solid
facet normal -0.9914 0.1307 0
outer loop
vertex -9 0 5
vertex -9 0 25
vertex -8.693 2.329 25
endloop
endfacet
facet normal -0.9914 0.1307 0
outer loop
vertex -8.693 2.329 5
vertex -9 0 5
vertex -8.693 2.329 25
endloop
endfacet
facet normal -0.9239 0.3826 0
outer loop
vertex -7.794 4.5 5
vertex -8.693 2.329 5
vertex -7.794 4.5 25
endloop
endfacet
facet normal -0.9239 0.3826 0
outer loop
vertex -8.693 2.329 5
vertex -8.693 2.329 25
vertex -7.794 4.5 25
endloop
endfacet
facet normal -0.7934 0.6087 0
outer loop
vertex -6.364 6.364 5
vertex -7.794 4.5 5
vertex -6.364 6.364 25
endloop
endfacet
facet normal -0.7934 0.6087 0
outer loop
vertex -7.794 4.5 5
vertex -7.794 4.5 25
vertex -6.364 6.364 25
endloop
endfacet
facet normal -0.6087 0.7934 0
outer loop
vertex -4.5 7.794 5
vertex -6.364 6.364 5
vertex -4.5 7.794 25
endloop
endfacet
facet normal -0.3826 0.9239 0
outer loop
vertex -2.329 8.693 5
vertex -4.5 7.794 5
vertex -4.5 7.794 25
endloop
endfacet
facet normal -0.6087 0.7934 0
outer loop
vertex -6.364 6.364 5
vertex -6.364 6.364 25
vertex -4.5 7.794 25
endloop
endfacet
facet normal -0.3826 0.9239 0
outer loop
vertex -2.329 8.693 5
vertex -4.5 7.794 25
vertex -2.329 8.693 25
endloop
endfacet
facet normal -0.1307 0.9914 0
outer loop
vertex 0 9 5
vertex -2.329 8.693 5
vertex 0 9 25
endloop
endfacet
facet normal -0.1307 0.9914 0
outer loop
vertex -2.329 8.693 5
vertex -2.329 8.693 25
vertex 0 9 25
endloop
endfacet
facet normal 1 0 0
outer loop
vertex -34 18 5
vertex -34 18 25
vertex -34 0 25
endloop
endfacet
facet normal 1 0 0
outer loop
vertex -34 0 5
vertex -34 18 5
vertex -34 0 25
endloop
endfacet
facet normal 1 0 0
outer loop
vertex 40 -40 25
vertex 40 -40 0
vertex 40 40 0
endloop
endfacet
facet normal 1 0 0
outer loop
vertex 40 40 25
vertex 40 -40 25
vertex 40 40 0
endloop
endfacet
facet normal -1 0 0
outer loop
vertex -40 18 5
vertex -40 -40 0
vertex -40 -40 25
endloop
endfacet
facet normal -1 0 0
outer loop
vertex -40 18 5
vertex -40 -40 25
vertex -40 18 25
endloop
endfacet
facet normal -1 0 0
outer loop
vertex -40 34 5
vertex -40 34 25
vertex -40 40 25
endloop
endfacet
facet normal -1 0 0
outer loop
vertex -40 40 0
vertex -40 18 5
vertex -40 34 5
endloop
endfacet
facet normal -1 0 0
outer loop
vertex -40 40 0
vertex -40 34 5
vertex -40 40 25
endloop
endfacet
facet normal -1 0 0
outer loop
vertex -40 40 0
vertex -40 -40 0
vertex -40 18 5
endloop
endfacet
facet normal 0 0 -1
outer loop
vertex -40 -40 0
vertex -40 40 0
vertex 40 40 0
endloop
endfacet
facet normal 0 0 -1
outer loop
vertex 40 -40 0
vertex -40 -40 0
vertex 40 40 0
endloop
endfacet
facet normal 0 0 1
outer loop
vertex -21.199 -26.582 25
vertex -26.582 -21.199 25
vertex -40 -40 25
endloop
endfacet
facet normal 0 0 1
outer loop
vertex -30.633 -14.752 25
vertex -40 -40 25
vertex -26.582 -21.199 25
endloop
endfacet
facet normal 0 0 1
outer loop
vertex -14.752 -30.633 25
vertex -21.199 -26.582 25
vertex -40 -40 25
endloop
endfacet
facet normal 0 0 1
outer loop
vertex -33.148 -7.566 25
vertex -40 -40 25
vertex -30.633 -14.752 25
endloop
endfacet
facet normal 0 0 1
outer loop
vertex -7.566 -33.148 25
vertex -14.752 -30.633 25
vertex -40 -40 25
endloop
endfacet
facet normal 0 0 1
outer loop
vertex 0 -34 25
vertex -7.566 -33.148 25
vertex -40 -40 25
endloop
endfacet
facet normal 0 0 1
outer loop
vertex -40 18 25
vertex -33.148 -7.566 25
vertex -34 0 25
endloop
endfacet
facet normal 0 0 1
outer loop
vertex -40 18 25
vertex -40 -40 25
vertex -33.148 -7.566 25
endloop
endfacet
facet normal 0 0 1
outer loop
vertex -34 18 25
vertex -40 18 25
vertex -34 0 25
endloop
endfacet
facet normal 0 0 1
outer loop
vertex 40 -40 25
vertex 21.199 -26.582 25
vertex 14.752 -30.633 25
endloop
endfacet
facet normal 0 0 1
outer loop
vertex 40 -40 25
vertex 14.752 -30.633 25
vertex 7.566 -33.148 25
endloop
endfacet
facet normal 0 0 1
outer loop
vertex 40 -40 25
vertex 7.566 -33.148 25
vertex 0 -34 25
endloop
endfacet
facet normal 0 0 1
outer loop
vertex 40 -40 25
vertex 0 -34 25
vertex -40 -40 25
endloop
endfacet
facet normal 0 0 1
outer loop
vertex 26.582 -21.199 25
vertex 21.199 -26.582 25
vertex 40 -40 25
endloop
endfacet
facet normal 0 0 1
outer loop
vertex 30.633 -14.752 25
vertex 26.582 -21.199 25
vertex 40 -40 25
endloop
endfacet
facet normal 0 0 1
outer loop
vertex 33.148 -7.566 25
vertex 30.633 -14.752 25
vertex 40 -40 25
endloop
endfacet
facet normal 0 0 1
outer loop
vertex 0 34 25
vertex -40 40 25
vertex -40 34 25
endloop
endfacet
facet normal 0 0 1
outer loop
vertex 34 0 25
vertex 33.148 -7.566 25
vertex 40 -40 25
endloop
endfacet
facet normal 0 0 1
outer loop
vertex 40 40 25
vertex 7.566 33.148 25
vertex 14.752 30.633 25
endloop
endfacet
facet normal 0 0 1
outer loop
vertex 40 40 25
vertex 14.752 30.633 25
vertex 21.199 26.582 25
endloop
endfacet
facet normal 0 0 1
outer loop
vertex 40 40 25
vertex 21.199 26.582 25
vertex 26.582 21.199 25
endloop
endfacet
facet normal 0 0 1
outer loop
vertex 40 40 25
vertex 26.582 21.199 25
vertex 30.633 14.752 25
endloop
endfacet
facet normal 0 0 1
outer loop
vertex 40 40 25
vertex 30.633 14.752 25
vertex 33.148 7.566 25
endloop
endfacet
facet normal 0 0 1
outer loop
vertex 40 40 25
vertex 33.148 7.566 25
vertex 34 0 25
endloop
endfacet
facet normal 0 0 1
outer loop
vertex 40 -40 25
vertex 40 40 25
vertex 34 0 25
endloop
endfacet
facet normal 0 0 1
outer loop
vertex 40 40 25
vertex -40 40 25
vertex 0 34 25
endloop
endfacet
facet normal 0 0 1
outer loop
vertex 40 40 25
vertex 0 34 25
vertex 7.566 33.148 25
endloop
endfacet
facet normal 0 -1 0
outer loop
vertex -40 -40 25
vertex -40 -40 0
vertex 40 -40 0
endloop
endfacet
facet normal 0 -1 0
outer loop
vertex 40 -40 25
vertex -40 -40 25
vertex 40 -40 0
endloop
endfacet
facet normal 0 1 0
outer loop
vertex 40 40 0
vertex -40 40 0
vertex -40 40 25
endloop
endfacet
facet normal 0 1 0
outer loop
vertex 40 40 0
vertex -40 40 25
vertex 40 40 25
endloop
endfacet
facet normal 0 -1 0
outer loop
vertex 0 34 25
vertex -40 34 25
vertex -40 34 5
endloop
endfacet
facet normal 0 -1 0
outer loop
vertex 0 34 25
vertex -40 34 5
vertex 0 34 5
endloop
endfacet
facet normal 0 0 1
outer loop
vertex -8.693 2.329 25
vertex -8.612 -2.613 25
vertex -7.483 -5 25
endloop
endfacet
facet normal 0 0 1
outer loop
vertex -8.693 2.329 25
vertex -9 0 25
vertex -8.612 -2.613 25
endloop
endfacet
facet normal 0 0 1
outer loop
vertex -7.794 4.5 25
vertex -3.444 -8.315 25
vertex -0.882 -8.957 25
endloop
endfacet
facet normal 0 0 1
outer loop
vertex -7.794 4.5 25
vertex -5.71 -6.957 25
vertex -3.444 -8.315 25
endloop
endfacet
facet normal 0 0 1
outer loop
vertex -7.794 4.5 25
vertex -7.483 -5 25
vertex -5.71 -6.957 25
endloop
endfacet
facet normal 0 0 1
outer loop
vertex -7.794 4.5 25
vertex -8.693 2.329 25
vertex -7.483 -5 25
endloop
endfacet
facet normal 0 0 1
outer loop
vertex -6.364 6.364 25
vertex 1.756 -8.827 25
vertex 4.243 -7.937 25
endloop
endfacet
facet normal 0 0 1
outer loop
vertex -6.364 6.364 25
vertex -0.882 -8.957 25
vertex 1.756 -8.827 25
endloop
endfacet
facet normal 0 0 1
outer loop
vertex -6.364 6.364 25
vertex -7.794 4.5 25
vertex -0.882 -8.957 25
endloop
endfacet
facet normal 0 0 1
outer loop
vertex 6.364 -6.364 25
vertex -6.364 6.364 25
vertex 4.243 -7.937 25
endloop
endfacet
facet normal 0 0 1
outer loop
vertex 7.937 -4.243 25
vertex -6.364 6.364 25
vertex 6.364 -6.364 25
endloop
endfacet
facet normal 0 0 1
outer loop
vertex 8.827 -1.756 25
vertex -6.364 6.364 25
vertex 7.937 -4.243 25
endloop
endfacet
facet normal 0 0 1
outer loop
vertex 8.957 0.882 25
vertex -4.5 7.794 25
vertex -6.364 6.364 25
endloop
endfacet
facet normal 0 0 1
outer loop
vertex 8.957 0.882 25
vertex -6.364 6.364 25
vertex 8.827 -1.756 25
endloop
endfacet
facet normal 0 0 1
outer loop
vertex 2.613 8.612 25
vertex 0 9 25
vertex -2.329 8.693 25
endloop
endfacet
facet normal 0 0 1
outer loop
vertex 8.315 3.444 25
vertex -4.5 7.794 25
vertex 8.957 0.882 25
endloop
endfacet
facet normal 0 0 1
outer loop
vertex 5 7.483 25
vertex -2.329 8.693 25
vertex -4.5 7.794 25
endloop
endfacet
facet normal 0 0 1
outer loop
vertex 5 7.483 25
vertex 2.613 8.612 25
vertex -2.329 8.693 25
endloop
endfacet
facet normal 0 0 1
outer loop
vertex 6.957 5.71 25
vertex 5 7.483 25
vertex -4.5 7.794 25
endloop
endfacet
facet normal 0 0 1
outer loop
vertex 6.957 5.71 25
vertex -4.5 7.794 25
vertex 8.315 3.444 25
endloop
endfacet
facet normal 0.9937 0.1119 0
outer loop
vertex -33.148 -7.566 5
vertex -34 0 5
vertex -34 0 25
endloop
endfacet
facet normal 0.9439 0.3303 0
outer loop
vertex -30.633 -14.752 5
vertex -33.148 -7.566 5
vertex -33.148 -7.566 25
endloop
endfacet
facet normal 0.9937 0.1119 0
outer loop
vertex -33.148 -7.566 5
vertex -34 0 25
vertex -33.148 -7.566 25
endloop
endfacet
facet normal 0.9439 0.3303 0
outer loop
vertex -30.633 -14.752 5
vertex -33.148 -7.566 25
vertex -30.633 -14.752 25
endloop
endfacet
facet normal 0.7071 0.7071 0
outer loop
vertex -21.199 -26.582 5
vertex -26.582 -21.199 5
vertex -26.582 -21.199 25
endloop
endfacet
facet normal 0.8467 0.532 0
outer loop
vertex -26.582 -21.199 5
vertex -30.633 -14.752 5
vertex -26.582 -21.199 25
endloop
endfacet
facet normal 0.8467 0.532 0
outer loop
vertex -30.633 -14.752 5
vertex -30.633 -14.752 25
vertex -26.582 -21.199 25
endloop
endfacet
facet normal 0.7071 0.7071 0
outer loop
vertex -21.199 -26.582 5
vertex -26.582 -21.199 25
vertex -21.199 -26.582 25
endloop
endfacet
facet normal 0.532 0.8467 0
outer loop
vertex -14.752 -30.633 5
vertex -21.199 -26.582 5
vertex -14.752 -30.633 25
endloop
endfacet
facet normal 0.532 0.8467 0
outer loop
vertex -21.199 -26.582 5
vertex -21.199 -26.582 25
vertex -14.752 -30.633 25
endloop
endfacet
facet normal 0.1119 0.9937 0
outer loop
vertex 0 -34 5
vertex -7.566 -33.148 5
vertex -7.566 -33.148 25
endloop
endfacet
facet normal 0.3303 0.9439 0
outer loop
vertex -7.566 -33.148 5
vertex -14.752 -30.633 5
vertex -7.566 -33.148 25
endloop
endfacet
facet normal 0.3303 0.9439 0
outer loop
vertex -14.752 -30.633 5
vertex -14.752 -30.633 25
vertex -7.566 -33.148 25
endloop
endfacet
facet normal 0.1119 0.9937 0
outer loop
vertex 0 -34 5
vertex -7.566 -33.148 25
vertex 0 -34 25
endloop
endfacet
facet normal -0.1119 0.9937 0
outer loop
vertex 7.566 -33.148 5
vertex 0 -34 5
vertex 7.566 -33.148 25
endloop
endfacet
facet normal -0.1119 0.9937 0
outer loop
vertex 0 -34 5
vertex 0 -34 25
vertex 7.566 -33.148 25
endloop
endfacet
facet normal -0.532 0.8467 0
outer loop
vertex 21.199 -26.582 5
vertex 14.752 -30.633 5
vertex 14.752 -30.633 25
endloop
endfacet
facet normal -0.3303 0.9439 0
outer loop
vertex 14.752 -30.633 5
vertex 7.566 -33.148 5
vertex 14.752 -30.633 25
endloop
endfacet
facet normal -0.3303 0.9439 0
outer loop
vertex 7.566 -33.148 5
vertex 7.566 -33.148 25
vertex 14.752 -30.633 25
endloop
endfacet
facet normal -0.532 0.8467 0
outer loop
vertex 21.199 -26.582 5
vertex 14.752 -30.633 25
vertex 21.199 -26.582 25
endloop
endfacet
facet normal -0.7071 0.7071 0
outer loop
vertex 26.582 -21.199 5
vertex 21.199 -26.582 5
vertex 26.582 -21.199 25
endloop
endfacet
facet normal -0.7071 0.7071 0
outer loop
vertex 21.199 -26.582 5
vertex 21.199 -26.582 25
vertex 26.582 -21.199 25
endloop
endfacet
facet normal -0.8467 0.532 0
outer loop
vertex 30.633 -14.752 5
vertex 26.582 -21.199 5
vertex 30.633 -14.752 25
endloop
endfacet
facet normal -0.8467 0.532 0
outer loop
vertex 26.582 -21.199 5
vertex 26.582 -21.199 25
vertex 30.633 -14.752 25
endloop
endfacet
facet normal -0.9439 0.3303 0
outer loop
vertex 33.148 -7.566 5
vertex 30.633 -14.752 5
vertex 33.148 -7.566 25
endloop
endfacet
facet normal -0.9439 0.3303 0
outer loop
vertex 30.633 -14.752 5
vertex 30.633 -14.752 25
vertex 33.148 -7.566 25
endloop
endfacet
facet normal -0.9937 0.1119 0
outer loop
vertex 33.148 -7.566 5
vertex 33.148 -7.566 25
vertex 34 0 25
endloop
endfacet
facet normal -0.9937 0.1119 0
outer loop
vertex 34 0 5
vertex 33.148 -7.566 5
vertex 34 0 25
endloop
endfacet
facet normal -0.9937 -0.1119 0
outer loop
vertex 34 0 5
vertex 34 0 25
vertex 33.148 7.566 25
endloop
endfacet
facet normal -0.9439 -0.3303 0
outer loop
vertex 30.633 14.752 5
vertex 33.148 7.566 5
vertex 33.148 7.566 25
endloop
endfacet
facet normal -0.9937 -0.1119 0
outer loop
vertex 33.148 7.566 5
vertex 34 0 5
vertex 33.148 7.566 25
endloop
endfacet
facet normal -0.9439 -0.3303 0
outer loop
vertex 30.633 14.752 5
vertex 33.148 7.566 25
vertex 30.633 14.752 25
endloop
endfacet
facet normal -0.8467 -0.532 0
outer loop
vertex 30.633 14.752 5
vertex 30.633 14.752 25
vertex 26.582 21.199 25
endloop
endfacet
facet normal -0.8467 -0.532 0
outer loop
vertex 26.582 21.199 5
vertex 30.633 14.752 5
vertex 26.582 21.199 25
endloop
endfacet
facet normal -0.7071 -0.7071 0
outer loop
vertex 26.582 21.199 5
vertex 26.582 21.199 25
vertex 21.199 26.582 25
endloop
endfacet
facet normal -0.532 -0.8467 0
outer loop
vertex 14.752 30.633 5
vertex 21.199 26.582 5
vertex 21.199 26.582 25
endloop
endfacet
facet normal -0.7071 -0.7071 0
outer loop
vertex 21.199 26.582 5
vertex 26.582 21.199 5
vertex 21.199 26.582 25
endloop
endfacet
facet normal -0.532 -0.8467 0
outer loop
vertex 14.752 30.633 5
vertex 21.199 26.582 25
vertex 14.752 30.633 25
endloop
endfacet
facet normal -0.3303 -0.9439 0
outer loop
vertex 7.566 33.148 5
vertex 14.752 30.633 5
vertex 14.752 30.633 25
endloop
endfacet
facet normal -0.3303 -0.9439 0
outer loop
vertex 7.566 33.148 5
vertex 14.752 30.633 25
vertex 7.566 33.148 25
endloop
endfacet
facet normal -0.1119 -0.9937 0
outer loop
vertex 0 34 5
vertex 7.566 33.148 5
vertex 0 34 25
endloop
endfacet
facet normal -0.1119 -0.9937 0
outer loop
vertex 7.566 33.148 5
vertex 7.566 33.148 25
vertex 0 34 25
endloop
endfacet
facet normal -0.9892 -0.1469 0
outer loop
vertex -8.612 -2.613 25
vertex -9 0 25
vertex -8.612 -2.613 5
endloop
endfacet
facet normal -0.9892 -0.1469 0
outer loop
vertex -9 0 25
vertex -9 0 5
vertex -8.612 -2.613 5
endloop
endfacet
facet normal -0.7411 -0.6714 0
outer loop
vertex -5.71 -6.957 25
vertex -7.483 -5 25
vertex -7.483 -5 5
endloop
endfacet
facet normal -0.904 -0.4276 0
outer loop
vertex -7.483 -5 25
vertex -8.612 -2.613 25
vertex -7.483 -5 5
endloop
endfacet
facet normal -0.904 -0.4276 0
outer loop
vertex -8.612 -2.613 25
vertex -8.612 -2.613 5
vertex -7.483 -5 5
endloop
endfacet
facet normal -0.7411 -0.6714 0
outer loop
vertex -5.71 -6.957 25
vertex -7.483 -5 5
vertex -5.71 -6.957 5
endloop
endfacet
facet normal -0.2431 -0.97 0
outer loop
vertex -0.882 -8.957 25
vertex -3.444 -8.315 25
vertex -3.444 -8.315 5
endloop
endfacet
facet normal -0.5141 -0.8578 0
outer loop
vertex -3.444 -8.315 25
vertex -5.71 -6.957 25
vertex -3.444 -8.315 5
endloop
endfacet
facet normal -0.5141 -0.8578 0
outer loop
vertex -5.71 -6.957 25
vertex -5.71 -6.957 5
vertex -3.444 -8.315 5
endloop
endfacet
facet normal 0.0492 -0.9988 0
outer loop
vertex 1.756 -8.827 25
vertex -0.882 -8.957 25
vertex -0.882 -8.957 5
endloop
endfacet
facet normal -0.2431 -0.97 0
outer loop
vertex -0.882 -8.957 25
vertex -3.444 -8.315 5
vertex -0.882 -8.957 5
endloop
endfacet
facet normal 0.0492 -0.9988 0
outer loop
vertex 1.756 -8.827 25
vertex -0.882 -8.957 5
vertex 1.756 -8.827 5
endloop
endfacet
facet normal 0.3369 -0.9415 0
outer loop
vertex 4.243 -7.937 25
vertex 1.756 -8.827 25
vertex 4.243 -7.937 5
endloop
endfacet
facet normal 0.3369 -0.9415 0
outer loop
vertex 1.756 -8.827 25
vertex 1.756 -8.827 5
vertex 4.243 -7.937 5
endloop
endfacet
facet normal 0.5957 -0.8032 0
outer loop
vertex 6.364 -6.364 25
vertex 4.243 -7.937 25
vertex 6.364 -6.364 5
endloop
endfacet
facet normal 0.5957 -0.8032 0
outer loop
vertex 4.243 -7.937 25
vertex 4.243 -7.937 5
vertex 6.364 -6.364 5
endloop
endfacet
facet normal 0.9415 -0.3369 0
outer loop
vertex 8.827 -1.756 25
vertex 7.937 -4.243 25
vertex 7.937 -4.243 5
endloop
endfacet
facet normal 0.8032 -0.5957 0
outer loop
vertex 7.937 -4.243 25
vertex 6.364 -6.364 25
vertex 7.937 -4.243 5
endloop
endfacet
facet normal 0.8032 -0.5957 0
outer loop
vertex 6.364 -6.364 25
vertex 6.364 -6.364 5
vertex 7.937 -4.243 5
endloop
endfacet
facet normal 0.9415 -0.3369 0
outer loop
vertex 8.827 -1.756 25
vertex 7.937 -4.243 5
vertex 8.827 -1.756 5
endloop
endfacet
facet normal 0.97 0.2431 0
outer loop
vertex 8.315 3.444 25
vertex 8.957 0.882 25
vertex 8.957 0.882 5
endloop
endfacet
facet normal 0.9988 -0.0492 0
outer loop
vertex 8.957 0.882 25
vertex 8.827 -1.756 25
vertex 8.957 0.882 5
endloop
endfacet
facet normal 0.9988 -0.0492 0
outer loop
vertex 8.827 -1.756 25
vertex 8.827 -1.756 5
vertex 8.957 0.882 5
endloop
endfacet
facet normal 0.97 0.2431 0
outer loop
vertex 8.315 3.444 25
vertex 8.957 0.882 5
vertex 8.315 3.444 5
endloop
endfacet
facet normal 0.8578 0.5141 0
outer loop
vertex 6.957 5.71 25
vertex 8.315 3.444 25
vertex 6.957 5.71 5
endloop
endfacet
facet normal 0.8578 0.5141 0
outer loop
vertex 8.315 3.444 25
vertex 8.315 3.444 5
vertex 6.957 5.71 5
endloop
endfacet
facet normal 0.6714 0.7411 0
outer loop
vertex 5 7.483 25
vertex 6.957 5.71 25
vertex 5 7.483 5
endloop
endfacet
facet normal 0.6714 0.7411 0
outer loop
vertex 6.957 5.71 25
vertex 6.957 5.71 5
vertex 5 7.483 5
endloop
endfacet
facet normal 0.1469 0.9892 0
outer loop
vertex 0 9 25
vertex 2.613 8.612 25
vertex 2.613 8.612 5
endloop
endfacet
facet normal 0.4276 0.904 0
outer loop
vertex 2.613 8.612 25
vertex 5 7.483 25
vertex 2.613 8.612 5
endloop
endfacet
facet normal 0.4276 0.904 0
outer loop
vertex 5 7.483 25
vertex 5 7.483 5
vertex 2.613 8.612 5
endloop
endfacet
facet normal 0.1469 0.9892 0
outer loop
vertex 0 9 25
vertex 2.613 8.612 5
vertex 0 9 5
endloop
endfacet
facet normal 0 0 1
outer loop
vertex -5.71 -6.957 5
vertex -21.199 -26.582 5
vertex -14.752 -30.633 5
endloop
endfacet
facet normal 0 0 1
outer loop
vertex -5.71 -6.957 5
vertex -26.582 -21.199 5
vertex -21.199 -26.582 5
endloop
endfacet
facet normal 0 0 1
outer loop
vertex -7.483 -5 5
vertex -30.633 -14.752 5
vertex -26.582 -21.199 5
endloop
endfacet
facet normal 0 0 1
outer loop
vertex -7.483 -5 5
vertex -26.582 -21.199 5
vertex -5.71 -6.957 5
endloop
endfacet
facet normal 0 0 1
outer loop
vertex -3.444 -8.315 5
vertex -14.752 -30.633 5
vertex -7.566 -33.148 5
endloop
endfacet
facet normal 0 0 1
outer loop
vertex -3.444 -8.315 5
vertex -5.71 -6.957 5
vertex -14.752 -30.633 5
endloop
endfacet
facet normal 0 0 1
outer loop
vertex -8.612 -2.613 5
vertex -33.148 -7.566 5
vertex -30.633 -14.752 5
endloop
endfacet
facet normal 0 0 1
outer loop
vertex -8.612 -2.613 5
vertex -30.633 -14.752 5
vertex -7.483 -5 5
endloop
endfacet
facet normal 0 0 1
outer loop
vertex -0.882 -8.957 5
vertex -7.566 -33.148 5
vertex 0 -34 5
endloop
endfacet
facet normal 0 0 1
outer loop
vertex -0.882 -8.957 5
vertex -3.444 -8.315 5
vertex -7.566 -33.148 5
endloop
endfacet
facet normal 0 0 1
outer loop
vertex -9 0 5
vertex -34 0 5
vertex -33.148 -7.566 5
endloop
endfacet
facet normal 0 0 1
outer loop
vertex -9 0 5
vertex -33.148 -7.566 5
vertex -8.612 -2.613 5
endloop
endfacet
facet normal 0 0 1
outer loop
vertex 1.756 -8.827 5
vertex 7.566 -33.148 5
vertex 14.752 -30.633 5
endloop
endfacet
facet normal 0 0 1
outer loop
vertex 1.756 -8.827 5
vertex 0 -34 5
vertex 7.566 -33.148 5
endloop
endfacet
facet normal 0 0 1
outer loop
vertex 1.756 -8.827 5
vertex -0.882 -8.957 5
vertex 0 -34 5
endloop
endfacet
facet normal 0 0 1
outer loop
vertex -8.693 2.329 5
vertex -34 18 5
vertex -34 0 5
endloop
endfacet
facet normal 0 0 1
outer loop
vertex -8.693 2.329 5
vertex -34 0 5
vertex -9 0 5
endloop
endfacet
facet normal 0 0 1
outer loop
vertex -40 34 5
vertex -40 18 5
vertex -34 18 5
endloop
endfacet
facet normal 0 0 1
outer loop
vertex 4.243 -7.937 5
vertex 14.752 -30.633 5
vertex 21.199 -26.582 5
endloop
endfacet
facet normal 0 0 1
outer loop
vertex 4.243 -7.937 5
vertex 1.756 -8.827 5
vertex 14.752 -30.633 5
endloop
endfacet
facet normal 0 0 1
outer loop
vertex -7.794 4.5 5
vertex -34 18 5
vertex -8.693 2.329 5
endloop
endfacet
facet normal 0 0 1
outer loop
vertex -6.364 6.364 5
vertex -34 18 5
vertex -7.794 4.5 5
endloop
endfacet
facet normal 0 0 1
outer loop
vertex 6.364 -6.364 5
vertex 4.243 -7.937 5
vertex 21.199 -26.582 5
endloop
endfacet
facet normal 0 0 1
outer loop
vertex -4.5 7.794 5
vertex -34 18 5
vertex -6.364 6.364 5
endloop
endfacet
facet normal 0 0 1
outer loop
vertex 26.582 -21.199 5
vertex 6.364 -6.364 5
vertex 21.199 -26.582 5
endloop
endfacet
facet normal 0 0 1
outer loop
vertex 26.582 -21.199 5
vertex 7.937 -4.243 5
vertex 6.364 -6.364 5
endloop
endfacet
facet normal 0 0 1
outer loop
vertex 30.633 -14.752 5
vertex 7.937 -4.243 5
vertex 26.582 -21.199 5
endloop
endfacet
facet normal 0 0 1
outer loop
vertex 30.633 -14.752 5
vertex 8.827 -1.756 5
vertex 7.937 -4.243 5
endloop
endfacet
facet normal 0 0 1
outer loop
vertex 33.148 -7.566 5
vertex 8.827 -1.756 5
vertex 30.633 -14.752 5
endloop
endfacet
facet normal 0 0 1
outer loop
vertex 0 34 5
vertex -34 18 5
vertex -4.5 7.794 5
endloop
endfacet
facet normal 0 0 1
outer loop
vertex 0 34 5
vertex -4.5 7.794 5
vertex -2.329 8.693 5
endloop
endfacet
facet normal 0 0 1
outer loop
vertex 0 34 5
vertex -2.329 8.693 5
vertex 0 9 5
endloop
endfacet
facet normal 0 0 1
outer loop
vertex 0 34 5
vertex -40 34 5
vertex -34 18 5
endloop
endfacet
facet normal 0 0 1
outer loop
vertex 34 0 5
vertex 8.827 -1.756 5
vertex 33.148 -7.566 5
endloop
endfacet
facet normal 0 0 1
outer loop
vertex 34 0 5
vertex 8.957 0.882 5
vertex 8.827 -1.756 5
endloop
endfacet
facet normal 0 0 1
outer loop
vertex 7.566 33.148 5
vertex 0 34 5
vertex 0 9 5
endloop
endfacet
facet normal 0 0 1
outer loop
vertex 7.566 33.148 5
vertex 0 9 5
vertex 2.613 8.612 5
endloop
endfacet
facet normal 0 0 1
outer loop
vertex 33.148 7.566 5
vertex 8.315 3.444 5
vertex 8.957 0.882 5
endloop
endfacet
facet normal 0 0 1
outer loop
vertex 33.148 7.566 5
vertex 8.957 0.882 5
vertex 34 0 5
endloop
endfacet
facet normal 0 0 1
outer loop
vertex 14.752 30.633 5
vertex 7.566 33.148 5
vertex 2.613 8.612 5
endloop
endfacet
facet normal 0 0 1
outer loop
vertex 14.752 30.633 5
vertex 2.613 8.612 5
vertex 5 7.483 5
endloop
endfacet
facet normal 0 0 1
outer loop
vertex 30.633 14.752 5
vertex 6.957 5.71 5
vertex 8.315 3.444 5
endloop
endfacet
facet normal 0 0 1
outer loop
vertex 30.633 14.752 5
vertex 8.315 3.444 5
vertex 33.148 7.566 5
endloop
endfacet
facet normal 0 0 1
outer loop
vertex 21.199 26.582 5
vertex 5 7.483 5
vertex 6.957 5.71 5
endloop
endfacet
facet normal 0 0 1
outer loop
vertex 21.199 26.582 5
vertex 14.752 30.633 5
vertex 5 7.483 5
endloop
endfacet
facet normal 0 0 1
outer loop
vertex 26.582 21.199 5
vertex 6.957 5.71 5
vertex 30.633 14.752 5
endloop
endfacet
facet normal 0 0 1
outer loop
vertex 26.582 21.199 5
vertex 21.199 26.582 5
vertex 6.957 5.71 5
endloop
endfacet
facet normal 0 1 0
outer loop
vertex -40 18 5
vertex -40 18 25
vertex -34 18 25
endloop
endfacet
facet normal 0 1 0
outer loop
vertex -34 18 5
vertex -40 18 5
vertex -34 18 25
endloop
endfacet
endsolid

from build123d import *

# Parameters (mm, degrees)
F0_W     = 80
F0_H     = 80
F1_DEPTH = 25
F2_R     = 34
F3_DEPTH = 20
F4_R     = 9
F5_DEPTH = 20
F7_DEPTH = 20
F8_W     = 6
F8_H     = 16
F9_DEPTH = 20


with BuildPart() as f1:
    # F0 (on Top) → F1 (new body)
    with BuildSketch(Plane.XY):
        Rectangle(F0_W, F0_H)
    extrude(amount=F1_DEPTH)

    # F2 (on face) → F3 (cut)
    with BuildSketch(Plane.XY.offset(25)):
        Circle(F2_R)
    extrude(amount=-F3_DEPTH, mode=Mode.SUBTRACT)

    # F4 (on face) → F5 (join)
    with BuildSketch(Plane.XY.offset(5)):
        Circle(F4_R)
    extrude(amount=F5_DEPTH)

    # F6 (on face) → F7 (cut, through all)
    with BuildSketch(Plane.XY.offset(25)):
        with BuildLine():
            Line((-34, 34), (-34, 0))
            Line((-34, 0), (-9, 0))
            ThreePointArc((-9, 0), (-6.363961, 6.363961), (0, 9))
            Line((0, 9), (0, 34))
            Line((0, 34), (-34, 34))
        make_face()
    extrude(amount=-F7_DEPTH, mode=Mode.SUBTRACT)

    # F8 (on face) → F9 (cut, through all)
    with BuildSketch(Plane.XY.offset(25)):
        with Locations((-37, 26)):
            Rectangle(F8_W, F8_H)
    extrude(amount=-F9_DEPTH, mode=Mode.SUBTRACT)


solid = f1.part
